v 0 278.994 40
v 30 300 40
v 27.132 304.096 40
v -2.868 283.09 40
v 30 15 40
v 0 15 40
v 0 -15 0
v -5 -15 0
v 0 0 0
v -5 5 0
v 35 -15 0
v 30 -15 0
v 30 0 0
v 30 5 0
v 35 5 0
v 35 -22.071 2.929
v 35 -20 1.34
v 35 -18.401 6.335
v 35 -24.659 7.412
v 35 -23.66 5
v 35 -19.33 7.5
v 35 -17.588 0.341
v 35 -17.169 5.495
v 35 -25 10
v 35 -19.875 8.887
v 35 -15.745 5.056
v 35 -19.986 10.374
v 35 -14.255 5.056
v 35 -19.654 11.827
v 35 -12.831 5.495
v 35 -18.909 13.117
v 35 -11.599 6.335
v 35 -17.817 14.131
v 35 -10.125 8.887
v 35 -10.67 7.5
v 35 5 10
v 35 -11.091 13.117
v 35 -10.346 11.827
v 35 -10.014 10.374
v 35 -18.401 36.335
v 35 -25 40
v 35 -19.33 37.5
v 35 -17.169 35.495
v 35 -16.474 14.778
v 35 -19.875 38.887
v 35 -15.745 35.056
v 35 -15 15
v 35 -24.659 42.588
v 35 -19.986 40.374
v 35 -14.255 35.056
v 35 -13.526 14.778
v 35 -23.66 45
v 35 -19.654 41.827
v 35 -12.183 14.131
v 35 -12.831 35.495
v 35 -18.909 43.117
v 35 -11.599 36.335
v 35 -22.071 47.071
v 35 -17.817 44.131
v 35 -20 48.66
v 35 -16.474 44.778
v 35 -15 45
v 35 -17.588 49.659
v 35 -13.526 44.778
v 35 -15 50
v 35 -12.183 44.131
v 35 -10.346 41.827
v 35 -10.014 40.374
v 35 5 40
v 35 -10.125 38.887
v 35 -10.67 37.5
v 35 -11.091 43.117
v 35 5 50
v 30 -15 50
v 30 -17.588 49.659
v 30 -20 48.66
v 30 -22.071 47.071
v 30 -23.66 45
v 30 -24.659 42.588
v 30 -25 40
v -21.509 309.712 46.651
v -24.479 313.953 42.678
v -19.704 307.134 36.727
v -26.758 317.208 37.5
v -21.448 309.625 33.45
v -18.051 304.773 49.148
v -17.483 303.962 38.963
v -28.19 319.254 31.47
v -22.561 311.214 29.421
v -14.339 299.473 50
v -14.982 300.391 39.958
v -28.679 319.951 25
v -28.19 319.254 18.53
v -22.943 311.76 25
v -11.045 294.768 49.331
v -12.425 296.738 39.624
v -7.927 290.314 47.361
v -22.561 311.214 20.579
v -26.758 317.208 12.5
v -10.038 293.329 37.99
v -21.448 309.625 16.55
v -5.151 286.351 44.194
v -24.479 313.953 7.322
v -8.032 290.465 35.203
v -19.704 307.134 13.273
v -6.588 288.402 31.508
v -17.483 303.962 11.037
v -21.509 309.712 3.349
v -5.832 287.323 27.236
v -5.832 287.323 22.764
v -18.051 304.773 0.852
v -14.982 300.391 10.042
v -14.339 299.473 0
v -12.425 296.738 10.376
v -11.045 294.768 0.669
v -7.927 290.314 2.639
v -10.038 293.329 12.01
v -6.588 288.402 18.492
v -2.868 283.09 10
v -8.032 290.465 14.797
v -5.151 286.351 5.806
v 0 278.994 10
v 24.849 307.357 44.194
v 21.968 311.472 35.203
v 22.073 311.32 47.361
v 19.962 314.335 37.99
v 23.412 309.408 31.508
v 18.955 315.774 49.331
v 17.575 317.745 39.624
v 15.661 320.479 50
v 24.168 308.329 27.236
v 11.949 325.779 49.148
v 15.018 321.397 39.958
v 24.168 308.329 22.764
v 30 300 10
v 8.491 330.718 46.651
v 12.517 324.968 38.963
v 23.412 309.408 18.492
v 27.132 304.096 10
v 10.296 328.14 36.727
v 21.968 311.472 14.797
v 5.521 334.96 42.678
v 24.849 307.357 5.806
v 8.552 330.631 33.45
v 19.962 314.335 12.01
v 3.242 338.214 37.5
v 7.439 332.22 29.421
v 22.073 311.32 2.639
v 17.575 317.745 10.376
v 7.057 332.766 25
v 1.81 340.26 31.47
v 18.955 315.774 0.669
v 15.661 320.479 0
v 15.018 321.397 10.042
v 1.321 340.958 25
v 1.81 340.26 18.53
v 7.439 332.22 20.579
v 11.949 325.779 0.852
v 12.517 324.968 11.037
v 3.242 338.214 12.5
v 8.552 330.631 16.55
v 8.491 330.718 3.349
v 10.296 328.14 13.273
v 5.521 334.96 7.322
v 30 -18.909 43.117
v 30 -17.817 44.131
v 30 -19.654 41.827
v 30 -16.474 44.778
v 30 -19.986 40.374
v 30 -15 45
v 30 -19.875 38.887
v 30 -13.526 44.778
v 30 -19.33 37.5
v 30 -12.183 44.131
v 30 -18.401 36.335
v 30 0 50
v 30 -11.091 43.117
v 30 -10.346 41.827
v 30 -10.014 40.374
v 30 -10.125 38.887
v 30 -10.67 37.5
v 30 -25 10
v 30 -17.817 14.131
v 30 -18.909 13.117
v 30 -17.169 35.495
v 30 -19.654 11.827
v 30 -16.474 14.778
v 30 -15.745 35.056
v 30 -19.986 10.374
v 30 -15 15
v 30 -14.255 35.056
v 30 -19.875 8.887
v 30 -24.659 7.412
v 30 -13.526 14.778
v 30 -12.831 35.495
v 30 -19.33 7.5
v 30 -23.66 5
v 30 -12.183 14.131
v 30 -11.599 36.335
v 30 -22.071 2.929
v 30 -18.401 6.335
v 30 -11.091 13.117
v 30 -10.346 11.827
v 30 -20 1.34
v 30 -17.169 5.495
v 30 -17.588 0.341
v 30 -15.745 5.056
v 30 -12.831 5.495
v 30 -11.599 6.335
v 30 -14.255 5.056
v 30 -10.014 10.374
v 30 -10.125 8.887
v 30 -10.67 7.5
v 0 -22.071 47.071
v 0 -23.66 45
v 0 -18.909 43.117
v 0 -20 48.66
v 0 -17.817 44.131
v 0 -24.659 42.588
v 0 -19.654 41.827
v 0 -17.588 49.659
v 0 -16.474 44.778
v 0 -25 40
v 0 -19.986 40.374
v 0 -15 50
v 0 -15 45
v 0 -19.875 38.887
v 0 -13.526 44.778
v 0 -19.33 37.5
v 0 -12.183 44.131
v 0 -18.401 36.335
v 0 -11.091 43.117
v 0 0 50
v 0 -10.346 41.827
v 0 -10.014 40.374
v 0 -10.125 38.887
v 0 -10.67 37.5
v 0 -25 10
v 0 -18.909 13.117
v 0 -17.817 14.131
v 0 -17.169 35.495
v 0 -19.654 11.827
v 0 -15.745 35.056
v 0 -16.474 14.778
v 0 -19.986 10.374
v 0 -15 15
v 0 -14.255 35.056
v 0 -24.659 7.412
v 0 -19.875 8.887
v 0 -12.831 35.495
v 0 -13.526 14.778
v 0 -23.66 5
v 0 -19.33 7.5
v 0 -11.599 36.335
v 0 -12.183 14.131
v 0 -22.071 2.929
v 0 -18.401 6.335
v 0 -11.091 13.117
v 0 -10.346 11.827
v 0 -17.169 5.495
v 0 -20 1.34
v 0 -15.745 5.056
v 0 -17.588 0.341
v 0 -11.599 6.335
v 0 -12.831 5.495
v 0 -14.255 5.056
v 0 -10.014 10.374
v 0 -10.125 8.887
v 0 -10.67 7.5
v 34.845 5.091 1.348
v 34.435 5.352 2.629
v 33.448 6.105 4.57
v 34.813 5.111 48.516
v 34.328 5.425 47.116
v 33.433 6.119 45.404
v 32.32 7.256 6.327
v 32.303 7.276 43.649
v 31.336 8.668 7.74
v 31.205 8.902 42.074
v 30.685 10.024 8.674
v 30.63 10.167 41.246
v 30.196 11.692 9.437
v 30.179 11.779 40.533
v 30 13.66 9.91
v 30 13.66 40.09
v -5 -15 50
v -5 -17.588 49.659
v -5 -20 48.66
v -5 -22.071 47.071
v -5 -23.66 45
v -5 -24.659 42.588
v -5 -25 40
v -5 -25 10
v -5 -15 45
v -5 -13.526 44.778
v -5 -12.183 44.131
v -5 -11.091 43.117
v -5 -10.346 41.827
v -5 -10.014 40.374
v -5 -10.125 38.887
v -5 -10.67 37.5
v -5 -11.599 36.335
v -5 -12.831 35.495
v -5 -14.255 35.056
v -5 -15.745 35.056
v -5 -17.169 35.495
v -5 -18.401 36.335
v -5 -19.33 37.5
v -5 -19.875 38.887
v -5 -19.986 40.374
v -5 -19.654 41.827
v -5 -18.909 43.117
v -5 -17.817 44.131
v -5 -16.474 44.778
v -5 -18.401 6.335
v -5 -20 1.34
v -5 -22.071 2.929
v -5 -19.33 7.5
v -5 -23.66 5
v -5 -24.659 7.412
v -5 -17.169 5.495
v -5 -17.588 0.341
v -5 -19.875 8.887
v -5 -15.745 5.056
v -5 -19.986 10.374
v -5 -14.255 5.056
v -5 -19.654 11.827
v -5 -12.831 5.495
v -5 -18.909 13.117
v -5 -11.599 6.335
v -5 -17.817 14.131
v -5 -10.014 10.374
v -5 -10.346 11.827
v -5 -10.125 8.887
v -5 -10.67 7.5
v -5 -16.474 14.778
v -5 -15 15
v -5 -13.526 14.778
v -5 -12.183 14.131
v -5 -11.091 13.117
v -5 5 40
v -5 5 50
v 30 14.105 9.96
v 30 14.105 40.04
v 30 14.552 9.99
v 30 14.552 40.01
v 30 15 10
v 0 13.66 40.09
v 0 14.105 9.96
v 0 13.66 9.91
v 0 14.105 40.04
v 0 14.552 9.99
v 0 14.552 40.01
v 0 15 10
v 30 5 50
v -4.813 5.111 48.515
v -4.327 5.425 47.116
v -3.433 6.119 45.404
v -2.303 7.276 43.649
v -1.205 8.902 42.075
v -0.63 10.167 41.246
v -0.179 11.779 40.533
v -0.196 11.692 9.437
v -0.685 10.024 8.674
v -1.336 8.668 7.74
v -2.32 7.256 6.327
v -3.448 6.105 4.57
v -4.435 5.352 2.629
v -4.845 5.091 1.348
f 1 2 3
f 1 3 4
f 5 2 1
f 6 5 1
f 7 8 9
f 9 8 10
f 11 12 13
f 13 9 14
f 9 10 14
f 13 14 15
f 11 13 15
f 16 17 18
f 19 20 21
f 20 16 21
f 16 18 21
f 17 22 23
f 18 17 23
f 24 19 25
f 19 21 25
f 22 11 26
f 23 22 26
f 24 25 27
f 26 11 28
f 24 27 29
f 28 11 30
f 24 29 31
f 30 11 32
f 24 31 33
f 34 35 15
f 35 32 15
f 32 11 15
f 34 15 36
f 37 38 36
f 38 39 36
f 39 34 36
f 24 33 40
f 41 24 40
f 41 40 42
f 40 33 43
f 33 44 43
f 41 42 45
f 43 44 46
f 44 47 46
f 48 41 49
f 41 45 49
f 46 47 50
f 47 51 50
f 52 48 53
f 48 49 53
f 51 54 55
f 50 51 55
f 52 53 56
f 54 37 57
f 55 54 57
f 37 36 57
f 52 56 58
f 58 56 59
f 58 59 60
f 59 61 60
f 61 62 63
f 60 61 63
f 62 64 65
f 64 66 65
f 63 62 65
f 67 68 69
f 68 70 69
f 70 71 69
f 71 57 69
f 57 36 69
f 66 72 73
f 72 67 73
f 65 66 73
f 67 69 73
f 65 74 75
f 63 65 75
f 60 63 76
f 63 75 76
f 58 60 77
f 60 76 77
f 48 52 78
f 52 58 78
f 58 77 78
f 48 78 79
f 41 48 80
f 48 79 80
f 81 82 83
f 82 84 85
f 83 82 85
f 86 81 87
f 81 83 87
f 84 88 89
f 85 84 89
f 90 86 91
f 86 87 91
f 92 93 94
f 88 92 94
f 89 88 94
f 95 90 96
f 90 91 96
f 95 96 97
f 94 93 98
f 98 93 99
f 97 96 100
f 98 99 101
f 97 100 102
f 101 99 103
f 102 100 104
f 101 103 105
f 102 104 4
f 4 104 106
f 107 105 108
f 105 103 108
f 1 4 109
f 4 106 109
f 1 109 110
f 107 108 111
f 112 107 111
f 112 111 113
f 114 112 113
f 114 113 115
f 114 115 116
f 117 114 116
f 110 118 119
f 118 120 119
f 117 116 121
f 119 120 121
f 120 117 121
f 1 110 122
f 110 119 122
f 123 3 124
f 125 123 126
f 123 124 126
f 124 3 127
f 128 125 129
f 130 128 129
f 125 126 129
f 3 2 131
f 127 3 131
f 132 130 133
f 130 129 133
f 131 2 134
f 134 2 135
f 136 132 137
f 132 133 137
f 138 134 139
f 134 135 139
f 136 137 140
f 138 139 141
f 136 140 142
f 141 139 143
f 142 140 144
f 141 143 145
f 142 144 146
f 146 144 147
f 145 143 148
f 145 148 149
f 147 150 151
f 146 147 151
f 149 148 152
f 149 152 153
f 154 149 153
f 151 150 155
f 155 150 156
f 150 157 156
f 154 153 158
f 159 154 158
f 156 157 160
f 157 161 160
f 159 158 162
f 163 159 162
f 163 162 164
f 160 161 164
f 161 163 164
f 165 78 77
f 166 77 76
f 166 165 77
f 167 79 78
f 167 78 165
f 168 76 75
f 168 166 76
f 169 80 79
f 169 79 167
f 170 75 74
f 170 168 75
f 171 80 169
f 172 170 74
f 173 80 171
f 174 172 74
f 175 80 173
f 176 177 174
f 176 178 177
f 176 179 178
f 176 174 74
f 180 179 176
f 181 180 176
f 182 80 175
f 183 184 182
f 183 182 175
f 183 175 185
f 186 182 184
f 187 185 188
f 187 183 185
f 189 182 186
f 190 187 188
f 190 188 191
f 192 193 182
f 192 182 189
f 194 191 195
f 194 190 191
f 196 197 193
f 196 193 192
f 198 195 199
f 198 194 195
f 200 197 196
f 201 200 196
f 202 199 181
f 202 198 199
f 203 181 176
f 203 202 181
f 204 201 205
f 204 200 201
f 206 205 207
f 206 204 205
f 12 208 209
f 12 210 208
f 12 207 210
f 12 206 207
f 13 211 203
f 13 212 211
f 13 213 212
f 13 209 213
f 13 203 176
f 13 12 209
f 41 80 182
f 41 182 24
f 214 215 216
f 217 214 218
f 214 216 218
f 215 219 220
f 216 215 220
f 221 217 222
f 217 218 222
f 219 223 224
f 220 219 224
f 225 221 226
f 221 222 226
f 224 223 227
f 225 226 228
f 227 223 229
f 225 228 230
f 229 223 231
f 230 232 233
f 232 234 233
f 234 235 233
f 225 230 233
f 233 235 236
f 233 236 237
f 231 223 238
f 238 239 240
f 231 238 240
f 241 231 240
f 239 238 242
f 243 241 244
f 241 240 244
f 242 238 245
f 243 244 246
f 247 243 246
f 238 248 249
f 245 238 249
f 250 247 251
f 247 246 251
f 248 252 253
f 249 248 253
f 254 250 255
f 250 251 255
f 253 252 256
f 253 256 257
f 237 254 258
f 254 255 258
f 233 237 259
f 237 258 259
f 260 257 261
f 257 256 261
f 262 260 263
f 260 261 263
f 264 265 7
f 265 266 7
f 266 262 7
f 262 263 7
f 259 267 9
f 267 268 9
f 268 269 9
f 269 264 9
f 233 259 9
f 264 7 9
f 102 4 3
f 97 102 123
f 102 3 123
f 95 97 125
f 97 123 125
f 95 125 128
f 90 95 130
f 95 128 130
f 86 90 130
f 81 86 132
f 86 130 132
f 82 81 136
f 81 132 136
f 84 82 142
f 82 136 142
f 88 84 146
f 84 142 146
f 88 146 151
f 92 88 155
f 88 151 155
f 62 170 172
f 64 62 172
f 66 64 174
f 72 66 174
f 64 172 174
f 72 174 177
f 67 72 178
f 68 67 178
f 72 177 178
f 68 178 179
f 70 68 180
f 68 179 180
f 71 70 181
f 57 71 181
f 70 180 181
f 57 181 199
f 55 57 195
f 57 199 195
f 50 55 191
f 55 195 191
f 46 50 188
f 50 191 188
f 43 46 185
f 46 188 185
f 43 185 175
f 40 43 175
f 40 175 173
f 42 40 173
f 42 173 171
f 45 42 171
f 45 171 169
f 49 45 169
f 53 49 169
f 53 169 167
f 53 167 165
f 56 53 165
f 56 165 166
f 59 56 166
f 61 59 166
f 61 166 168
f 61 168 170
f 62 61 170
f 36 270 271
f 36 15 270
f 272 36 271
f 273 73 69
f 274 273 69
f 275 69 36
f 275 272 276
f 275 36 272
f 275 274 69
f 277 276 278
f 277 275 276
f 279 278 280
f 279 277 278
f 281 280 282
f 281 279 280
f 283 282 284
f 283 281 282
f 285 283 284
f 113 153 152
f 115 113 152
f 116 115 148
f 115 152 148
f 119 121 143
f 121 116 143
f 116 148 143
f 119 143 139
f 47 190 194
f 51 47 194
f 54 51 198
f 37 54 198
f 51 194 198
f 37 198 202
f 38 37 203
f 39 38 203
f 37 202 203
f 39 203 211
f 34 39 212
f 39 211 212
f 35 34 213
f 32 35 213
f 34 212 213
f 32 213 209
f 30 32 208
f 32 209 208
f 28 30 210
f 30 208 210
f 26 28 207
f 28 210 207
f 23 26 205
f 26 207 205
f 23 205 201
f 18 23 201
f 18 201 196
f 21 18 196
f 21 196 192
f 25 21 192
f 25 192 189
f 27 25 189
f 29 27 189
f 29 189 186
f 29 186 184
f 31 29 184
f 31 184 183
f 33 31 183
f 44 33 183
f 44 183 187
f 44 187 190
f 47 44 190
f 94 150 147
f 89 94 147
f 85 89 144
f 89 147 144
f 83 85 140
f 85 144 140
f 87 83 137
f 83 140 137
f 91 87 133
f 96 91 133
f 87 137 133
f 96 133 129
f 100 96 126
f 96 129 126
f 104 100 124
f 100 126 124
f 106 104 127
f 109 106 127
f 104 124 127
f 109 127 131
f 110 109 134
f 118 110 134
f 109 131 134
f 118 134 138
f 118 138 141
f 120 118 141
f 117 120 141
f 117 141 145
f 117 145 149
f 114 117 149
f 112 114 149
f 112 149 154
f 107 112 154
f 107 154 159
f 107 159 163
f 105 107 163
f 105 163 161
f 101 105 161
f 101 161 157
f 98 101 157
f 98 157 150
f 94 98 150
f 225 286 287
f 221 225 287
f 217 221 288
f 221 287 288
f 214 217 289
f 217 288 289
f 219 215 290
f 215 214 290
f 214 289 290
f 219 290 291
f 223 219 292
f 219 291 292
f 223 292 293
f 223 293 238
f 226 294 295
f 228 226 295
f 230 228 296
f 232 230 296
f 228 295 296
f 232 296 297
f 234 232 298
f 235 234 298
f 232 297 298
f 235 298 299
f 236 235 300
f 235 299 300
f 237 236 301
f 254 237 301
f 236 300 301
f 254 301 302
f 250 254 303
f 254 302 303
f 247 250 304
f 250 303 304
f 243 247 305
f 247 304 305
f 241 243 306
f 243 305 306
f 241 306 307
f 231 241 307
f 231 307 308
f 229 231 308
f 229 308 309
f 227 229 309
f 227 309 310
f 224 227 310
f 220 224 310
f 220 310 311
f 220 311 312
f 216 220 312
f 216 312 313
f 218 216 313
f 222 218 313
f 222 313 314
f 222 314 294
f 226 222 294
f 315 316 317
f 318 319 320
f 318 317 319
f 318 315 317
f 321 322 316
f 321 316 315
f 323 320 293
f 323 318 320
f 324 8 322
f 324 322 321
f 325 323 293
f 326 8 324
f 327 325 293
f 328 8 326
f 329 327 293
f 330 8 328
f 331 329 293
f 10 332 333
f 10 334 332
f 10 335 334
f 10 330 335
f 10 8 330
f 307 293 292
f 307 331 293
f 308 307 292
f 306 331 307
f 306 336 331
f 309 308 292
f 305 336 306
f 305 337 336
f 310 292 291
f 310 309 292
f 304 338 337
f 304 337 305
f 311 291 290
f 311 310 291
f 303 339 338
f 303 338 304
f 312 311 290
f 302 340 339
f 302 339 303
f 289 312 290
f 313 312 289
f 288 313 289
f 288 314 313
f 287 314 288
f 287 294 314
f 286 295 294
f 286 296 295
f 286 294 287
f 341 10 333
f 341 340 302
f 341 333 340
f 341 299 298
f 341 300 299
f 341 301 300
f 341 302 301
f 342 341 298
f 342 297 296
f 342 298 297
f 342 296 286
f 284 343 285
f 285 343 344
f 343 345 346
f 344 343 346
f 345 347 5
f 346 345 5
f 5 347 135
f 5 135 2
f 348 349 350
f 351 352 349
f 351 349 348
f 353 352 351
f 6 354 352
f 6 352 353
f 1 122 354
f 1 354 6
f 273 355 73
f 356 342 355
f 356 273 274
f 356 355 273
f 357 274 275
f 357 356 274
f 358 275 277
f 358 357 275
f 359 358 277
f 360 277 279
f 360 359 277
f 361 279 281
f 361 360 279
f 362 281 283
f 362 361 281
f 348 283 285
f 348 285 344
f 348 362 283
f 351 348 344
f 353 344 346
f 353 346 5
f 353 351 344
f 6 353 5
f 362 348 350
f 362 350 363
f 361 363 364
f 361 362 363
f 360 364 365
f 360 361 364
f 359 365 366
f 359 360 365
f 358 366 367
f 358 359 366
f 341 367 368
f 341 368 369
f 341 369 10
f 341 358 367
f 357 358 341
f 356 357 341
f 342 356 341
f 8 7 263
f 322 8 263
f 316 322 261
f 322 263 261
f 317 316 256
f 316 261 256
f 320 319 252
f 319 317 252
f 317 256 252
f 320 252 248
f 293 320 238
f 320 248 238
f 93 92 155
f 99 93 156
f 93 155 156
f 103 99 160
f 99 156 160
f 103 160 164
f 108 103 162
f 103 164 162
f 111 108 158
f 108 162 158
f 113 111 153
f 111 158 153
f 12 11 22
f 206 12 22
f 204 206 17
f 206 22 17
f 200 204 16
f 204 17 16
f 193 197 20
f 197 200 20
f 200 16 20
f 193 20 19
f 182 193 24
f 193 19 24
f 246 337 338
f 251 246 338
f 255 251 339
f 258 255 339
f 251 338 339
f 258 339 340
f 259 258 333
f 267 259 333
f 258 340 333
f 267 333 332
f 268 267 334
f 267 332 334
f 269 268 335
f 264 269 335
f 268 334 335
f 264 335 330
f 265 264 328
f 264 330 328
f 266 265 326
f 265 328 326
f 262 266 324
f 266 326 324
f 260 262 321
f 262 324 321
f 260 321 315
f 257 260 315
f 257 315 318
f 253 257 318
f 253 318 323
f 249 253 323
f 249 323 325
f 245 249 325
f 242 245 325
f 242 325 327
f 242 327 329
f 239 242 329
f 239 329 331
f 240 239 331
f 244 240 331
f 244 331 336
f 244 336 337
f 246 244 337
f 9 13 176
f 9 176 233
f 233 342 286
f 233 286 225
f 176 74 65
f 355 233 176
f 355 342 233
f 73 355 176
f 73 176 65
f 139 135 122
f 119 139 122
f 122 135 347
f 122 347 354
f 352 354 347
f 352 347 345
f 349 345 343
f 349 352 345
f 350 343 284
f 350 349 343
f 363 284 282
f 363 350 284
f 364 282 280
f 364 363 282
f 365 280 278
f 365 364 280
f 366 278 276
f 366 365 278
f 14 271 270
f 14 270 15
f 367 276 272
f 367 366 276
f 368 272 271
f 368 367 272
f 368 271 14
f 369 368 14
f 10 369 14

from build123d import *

# Parameters (mm, degrees)
BOSS_EXTRUDE1_DEPTH = 50
CUT_EXTRUDE4_DEPTH  = 10
CUT_EXTRUDE5_DEPTH  = 10
SKETCH6_R           = 15
CUT_EXTRUDE6_DEPTH  = 301.947465254
CUT_EXTRUDE7_DEPTH  = 301.947465254
SKETCH8_W           = 30
SKETCH8_H           = 5
CUT_EXTRUDE8_DEPTH  = 346.907627132
SKETCH9_W           = 40
SKETCH9_H           = 50
BOSS_EXTRUDE2_DEPTH = 30
FILLET1_R           = 10
SKETCH10_W          = 30
SKETCH10_H          = 25
CUT_EXTRUDE9_DEPTH  = 347.377087182
SKETCH11_R          = 5
CUT_EXTRUDE10_DEPTH = 347.917982419


with BuildPart() as part:
    # Sketch1 → Boss-Extrude1 (new body)
    with BuildSketch(Plane.XY):
        Polygon((0, 0), (30, 0), (30, 300), (1.321178182, 340.957602214), (-28.678821818, 319.951376068), (0, 278.993773854), align=None)
    extrude(amount=BOSS_EXTRUDE1_DEPTH)

    # Sketch3 → Cut-Extrude4 (cut)
    with BuildSketch(Plane.XY.offset(50)):
        Polygon((30, 300), (0, 278.993773854), (0, 5), (30, 5), align=None)
    extrude(amount=-CUT_EXTRUDE4_DEPTH, mode=Mode.SUBTRACT)

    # Sketch4 → Cut-Extrude5 (cut)
    with BuildSketch(Plane(origin=(0, 0, 0), x_dir=(-1, 0, 0), z_dir=(0, 0, -1))):
        Polygon((-30, 300), (0, 278.993773854), (0, 5), (-30, 5), align=None)
    extrude(amount=-CUT_EXTRUDE5_DEPTH, mode=Mode.SUBTRACT)

    # Sketch6 → Cut-Extrude6 (cut, through all)
    with BuildSketch(Plane(origin=(161.084195268, 112.792367813, 0), x_dir=(0, 0, -1), z_dir=(0.819152044288991, 0.5735764363510472, 0))):
        with Locations(Location((-25, 253.538320196, 0), (0, 0, 90))):
            Circle(SKETCH6_R)
    extrude(amount=-CUT_EXTRUDE6_DEPTH, mode=Mode.SUBTRACT)

    # Sketch7 → Cut-Extrude7 (cut, through all)
    with BuildSketch(Plane(origin=(161.084195268, 112.792367813, 0), x_dir=(0, 0, -1), z_dir=(0.819152044288991, 0.5735764363510472, 0))):
        with BuildLine():
            Line((-50, 228.538320196), (-40, 228.538320196))
            Line((-40, 228.538320196), (-40, 233.538320196))
            ThreePointArc((-40, 233.538320196), (-47.360679775, 242.357980309), (-50, 253.538320196))
            Line((-50, 253.538320196), (-50, 228.538320196))
        make_face()
        with BuildLine():
            Line((-50, 278.538320196), (-50, 253.538320196))
            ThreePointArc((-50, 253.538320196), (-42.67766953, 271.215989726), (-25, 278.538320196))
            Line((-25, 278.538320196), (-50, 278.538320196))
        make_face()
        with BuildLine():
            Line((0, 278.538320196), (-25, 278.538320196))
            ThreePointArc((-25, 278.538320196), (-7.32233047, 271.215989726), (0, 253.538320196))
            Line((0, 253.538320196), (0, 278.538320196))
        make_face()
        with BuildLine():
            Line((0, 228.538320196), (0, 253.538320196))
            ThreePointArc((0, 253.538320196), (-2.639320225, 242.357980309), (-10, 233.538320196))
            Line((-10, 233.538320196), (-10, 228.538320196))
            Line((-10, 228.538320196), (0, 228.538320196))
        make_face()
    extrude(amount=-CUT_EXTRUDE7_DEPTH, mode=Mode.SUBTRACT)

    # Sketch8 → Cut-Extrude8 (cut, through all)
    with BuildSketch(Plane.XY.offset(50)):
        with Locations((15, 2.5)):
            Rectangle(SKETCH8_W, SKETCH8_H)
    extrude(amount=-CUT_EXTRUDE8_DEPTH, mode=Mode.SUBTRACT)

    # Sketch9 → Boss-Extrude2 (add)
    with BuildSketch(Plane.XZ.offset(-5)):
        with Locations((15, 25)):
            Rectangle(SKETCH9_W, SKETCH9_H)
    extrude(amount=BOSS_EXTRUDE2_DEPTH)

    # Fillet1
    # the kernel refuses this fillet: 10 mm, written as the material it adds along each edge
    with BuildSketch(Plane(origin=(0, 5, 40), x_dir=(-1, 0, 0), z_dir=(0, 0, -1))) as fillet1_piece_1:
        with BuildLine():
            CenterArc((10, 8.660254038), FILLET1_R, 180, 60)
            Line((0, 8.660254038), (0, 0))
            Line((0, 0), (5, 0))
        make_face()
    extrude(amount=30)
    with BuildSketch(Plane(origin=(30, 5, 40), x_dir=(1, 0, 0), z_dir=(0, 0, -1))) as fillet1_piece_2:
        with BuildLine():
            CenterArc((10, -8.660254038), FILLET1_R, 120, 60)
            Line((0, -8.660254038), (0, 0))
            Line((0, 0), (5, 0))
        make_face()
    extrude(amount=30)
    with BuildSketch(Plane(origin=(0, 5, 40), x_dir=(0, 0, 1), z_dir=(1, 0, 0))) as fillet1_piece_3:
        with BuildLine():
            CenterArc((FILLET1_R, -FILLET1_R), FILLET1_R, 90, 90)
            Line((0, -FILLET1_R), (0, 0))
            Line((0, 0), (FILLET1_R, 0))
        make_face()
    extrude(amount=30)
    with BuildSketch(Plane(origin=(0, 5, 10), x_dir=(0, 0, -1), z_dir=(1, 0, 0))) as fillet1_piece_4:
        with BuildLine():
            CenterArc((FILLET1_R, FILLET1_R), FILLET1_R, 180, 90)
            Line((0, FILLET1_R), (0, 0))
            Line((0, 0), (FILLET1_R, 0))
        make_face()
    extrude(amount=30)
    with BuildSketch(Plane(origin=(-25, 5, 40), x_dir=(0, 0, 1), z_dir=(1, 0, 0))) as fillet1_piece_5a_section:
        with BuildLine():
            CenterArc((FILLET1_R, -FILLET1_R), FILLET1_R, 90, 90)
            Line((0, -FILLET1_R), (0, 0))
            Line((0, 0), (FILLET1_R, 0))
        make_face()
    fillet1_piece_5a = extrude(amount=55, mode=Mode.PRIVATE)
    fillet1_piece_5a = split(fillet1_piece_5a, bisect_by=Plane(origin=(-5, 5, 40), z_dir=(1, 0, 0)), keep=Keep.TOP, mode=Mode.PRIVATE)
    fillet1_piece_5a = split(fillet1_piece_5a, bisect_by=Plane(origin=(0, 5, 40), z_dir=(-1, 0, 0)), keep=Keep.TOP, mode=Mode.PRIVATE)
    with BuildSketch(Plane(origin=(0, 5, 61.650635095), x_dir=(-1, 0, 0), z_dir=(0, 0, -1))) as fillet1_piece_5b_section:
        with BuildLine():
            CenterArc((10, 8.660254038), FILLET1_R, 180, 60)
            Line((0, 8.660254038), (0, 0))
            Line((0, 0), (5, 0))
        make_face()
    fillet1_piece_5b = extrude(amount=51.650635095, mode=Mode.PRIVATE)
    fillet1_piece_5b = split(fillet1_piece_5b, bisect_by=Plane(origin=(0, 5, 50), z_dir=(0, 0, -1)), keep=Keep.TOP, mode=Mode.PRIVATE)
    fillet1_piece_5b = split(fillet1_piece_5b, bisect_by=Plane(origin=(0, 5, 40), z_dir=(0, 0, 1)), keep=Keep.TOP, mode=Mode.PRIVATE)
    fillet1_piece_5 = fillet1_piece_5a & fillet1_piece_5b
    add(fillet1_piece_5)
    with BuildSketch(Plane(origin=(-25, 5, 10), x_dir=(0, 0, -1), z_dir=(1, 0, 0))) as fillet1_piece_6a_section:
        with BuildLine():
            CenterArc((FILLET1_R, FILLET1_R), FILLET1_R, 180, 90)
            Line((0, FILLET1_R), (0, 0))
            Line((0, 0), (FILLET1_R, 0))
        make_face()
    fillet1_piece_6a = extrude(amount=55, mode=Mode.PRIVATE)
    fillet1_piece_6a = split(fillet1_piece_6a, bisect_by=Plane(origin=(-5, 5, 10), z_dir=(1, 0, 0)), keep=Keep.TOP, mode=Mode.PRIVATE)
    fillet1_piece_6a = split(fillet1_piece_6a, bisect_by=Plane(origin=(0, 5, 10), z_dir=(-1, 0, 0)), keep=Keep.TOP, mode=Mode.PRIVATE)
    with BuildSketch(Plane(origin=(0, 5, 40), x_dir=(-1, 0, 0), z_dir=(0, 0, -1))) as fillet1_piece_6b_section:
        with BuildLine():
            CenterArc((10, 8.660254038), FILLET1_R, 180, 60)
            Line((0, 8.660254038), (0, 0))
            Line((0, 0), (5, 0))
        make_face()
    fillet1_piece_6b = extrude(amount=51.650635095, mode=Mode.PRIVATE)
    fillet1_piece_6b = split(fillet1_piece_6b, bisect_by=Plane(origin=(0, 5, 0), z_dir=(0, 0, 1)), keep=Keep.TOP, mode=Mode.PRIVATE)
    fillet1_piece_6b = split(fillet1_piece_6b, bisect_by=Plane(origin=(0, 5, 10), z_dir=(0, 0, -1)), keep=Keep.TOP, mode=Mode.PRIVATE)
    fillet1_piece_6 = fillet1_piece_6a & fillet1_piece_6b
    add(fillet1_piece_6)
    with BuildSketch(Plane(origin=(0, 5, 40), x_dir=(0, 0, 1), z_dir=(1, 0, 0))) as fillet1_piece_7a_section:
        with BuildLine():
            CenterArc((FILLET1_R, -FILLET1_R), FILLET1_R, 90, 90)
            Line((0, -FILLET1_R), (0, 0))
            Line((0, 0), (FILLET1_R, 0))
        make_face()
    fillet1_piece_7a = extrude(amount=55, mode=Mode.PRIVATE)
    fillet1_piece_7a = split(fillet1_piece_7a, bisect_by=Plane(origin=(35, 5, 40), z_dir=(-1, 0, 0)), keep=Keep.TOP, mode=Mode.PRIVATE)
    fillet1_piece_7a = split(fillet1_piece_7a, bisect_by=Plane(origin=(30, 5, 40), z_dir=(1, 0, 0)), keep=Keep.TOP, mode=Mode.PRIVATE)
    with BuildSketch(Plane(origin=(30, 5, 61.650635095), x_dir=(1, 0, 0), z_dir=(0, 0, -1))) as fillet1_piece_7b_section:
        with BuildLine():
            CenterArc((10, -8.660254038), FILLET1_R, 120, 60)
            Line((0, -8.660254038), (0, 0))
            Line((0, 0), (5, 0))
        make_face()
    fillet1_piece_7b = extrude(amount=51.650635095, mode=Mode.PRIVATE)
    fillet1_piece_7b = split(fillet1_piece_7b, bisect_by=Plane(origin=(30, 5, 50), z_dir=(0, 0, -1)), keep=Keep.TOP, mode=Mode.PRIVATE)
    fillet1_piece_7b = split(fillet1_piece_7b, bisect_by=Plane(origin=(30, 5, 40), z_dir=(0, 0, 1)), keep=Keep.TOP, mode=Mode.PRIVATE)
    fillet1_piece_7 = fillet1_piece_7a & fillet1_piece_7b
    add(fillet1_piece_7)
    with BuildSketch(Plane(origin=(30, 5, 40), x_dir=(1, 0, 0), z_dir=(0, 0, -1))) as fillet1_piece_8a_section:
        with BuildLine():
            CenterArc((10, -8.660254038), FILLET1_R, 120, 60)
            Line((0, -8.660254038), (0, 0))
            Line((0, 0), (5, 0))
        make_face()
    fillet1_piece_8a = extrude(amount=51.650635095, mode=Mode.PRIVATE)
    fillet1_piece_8a = split(fillet1_piece_8a, bisect_by=Plane(origin=(30, 5, 0), z_dir=(0, 0, 1)), keep=Keep.TOP, mode=Mode.PRIVATE)
    fillet1_piece_8a = split(fillet1_piece_8a, bisect_by=Plane(origin=(30, 5, 10), z_dir=(0, 0, -1)), keep=Keep.TOP, mode=Mode.PRIVATE)
    with BuildSketch(Plane(origin=(0, 5, 10), x_dir=(0, 0, -1), z_dir=(1, 0, 0))) as fillet1_piece_8b_section:
        with BuildLine():
            CenterArc((FILLET1_R, FILLET1_R), FILLET1_R, 180, 90)
            Line((0, FILLET1_R), (0, 0))
            Line((0, 0), (FILLET1_R, 0))
        make_face()
    fillet1_piece_8b = extrude(amount=55, mode=Mode.PRIVATE)
    fillet1_piece_8b = split(fillet1_piece_8b, bisect_by=Plane(origin=(35, 5, 10), z_dir=(-1, 0, 0)), keep=Keep.TOP, mode=Mode.PRIVATE)
    fillet1_piece_8b = split(fillet1_piece_8b, bisect_by=Plane(origin=(30, 5, 10), z_dir=(1, 0, 0)), keep=Keep.TOP, mode=Mode.PRIVATE)
    fillet1_piece_8 = fillet1_piece_8a & fillet1_piece_8b
    add(fillet1_piece_8)
    # the kernel refuses this fillet: 10 mm, written as the material it takes off along each edge
    with BuildSketch(Plane(origin=(60, -25, 0), x_dir=(0, 1, 0), z_dir=(-1, 0, 0)), Plane(origin=(-30, -25, 50), x_dir=(0, 1, 0), z_dir=(1, 0, 0))) as fillet1_2_piece_1:
        with BuildLine():
            CenterArc((FILLET1_R, -FILLET1_R), FILLET1_R, 90, 90)
            Line((0, -FILLET1_R), (0, 0))
            Line((0, 0), (FILLET1_R, 0))
        make_face()
    extrude(amount=90, mode=Mode.SUBTRACT)

    # Sketch10 → Cut-Extrude9 (cut, through all)
    with BuildSketch(Plane(origin=(0, 0, 0), x_dir=(-1, 0, 0), z_dir=(0, 0, -1))):
        with Locations((-15, -12.5)):
            Rectangle(SKETCH10_W, SKETCH10_H)
    extrude(amount=-CUT_EXTRUDE9_DEPTH, mode=Mode.SUBTRACT)

    # Sketch11 → Cut-Extrude10 (cut, through all)
    with BuildSketch(Plane.ZY.offset(5)):
        with Locations((10, -15)):
            Circle(SKETCH11_R)
        with Locations((40, -15)):
            Circle(SKETCH11_R)
    extrude(amount=-CUT_EXTRUDE10_DEPTH, mode=Mode.SUBTRACT)


solid = part.part
